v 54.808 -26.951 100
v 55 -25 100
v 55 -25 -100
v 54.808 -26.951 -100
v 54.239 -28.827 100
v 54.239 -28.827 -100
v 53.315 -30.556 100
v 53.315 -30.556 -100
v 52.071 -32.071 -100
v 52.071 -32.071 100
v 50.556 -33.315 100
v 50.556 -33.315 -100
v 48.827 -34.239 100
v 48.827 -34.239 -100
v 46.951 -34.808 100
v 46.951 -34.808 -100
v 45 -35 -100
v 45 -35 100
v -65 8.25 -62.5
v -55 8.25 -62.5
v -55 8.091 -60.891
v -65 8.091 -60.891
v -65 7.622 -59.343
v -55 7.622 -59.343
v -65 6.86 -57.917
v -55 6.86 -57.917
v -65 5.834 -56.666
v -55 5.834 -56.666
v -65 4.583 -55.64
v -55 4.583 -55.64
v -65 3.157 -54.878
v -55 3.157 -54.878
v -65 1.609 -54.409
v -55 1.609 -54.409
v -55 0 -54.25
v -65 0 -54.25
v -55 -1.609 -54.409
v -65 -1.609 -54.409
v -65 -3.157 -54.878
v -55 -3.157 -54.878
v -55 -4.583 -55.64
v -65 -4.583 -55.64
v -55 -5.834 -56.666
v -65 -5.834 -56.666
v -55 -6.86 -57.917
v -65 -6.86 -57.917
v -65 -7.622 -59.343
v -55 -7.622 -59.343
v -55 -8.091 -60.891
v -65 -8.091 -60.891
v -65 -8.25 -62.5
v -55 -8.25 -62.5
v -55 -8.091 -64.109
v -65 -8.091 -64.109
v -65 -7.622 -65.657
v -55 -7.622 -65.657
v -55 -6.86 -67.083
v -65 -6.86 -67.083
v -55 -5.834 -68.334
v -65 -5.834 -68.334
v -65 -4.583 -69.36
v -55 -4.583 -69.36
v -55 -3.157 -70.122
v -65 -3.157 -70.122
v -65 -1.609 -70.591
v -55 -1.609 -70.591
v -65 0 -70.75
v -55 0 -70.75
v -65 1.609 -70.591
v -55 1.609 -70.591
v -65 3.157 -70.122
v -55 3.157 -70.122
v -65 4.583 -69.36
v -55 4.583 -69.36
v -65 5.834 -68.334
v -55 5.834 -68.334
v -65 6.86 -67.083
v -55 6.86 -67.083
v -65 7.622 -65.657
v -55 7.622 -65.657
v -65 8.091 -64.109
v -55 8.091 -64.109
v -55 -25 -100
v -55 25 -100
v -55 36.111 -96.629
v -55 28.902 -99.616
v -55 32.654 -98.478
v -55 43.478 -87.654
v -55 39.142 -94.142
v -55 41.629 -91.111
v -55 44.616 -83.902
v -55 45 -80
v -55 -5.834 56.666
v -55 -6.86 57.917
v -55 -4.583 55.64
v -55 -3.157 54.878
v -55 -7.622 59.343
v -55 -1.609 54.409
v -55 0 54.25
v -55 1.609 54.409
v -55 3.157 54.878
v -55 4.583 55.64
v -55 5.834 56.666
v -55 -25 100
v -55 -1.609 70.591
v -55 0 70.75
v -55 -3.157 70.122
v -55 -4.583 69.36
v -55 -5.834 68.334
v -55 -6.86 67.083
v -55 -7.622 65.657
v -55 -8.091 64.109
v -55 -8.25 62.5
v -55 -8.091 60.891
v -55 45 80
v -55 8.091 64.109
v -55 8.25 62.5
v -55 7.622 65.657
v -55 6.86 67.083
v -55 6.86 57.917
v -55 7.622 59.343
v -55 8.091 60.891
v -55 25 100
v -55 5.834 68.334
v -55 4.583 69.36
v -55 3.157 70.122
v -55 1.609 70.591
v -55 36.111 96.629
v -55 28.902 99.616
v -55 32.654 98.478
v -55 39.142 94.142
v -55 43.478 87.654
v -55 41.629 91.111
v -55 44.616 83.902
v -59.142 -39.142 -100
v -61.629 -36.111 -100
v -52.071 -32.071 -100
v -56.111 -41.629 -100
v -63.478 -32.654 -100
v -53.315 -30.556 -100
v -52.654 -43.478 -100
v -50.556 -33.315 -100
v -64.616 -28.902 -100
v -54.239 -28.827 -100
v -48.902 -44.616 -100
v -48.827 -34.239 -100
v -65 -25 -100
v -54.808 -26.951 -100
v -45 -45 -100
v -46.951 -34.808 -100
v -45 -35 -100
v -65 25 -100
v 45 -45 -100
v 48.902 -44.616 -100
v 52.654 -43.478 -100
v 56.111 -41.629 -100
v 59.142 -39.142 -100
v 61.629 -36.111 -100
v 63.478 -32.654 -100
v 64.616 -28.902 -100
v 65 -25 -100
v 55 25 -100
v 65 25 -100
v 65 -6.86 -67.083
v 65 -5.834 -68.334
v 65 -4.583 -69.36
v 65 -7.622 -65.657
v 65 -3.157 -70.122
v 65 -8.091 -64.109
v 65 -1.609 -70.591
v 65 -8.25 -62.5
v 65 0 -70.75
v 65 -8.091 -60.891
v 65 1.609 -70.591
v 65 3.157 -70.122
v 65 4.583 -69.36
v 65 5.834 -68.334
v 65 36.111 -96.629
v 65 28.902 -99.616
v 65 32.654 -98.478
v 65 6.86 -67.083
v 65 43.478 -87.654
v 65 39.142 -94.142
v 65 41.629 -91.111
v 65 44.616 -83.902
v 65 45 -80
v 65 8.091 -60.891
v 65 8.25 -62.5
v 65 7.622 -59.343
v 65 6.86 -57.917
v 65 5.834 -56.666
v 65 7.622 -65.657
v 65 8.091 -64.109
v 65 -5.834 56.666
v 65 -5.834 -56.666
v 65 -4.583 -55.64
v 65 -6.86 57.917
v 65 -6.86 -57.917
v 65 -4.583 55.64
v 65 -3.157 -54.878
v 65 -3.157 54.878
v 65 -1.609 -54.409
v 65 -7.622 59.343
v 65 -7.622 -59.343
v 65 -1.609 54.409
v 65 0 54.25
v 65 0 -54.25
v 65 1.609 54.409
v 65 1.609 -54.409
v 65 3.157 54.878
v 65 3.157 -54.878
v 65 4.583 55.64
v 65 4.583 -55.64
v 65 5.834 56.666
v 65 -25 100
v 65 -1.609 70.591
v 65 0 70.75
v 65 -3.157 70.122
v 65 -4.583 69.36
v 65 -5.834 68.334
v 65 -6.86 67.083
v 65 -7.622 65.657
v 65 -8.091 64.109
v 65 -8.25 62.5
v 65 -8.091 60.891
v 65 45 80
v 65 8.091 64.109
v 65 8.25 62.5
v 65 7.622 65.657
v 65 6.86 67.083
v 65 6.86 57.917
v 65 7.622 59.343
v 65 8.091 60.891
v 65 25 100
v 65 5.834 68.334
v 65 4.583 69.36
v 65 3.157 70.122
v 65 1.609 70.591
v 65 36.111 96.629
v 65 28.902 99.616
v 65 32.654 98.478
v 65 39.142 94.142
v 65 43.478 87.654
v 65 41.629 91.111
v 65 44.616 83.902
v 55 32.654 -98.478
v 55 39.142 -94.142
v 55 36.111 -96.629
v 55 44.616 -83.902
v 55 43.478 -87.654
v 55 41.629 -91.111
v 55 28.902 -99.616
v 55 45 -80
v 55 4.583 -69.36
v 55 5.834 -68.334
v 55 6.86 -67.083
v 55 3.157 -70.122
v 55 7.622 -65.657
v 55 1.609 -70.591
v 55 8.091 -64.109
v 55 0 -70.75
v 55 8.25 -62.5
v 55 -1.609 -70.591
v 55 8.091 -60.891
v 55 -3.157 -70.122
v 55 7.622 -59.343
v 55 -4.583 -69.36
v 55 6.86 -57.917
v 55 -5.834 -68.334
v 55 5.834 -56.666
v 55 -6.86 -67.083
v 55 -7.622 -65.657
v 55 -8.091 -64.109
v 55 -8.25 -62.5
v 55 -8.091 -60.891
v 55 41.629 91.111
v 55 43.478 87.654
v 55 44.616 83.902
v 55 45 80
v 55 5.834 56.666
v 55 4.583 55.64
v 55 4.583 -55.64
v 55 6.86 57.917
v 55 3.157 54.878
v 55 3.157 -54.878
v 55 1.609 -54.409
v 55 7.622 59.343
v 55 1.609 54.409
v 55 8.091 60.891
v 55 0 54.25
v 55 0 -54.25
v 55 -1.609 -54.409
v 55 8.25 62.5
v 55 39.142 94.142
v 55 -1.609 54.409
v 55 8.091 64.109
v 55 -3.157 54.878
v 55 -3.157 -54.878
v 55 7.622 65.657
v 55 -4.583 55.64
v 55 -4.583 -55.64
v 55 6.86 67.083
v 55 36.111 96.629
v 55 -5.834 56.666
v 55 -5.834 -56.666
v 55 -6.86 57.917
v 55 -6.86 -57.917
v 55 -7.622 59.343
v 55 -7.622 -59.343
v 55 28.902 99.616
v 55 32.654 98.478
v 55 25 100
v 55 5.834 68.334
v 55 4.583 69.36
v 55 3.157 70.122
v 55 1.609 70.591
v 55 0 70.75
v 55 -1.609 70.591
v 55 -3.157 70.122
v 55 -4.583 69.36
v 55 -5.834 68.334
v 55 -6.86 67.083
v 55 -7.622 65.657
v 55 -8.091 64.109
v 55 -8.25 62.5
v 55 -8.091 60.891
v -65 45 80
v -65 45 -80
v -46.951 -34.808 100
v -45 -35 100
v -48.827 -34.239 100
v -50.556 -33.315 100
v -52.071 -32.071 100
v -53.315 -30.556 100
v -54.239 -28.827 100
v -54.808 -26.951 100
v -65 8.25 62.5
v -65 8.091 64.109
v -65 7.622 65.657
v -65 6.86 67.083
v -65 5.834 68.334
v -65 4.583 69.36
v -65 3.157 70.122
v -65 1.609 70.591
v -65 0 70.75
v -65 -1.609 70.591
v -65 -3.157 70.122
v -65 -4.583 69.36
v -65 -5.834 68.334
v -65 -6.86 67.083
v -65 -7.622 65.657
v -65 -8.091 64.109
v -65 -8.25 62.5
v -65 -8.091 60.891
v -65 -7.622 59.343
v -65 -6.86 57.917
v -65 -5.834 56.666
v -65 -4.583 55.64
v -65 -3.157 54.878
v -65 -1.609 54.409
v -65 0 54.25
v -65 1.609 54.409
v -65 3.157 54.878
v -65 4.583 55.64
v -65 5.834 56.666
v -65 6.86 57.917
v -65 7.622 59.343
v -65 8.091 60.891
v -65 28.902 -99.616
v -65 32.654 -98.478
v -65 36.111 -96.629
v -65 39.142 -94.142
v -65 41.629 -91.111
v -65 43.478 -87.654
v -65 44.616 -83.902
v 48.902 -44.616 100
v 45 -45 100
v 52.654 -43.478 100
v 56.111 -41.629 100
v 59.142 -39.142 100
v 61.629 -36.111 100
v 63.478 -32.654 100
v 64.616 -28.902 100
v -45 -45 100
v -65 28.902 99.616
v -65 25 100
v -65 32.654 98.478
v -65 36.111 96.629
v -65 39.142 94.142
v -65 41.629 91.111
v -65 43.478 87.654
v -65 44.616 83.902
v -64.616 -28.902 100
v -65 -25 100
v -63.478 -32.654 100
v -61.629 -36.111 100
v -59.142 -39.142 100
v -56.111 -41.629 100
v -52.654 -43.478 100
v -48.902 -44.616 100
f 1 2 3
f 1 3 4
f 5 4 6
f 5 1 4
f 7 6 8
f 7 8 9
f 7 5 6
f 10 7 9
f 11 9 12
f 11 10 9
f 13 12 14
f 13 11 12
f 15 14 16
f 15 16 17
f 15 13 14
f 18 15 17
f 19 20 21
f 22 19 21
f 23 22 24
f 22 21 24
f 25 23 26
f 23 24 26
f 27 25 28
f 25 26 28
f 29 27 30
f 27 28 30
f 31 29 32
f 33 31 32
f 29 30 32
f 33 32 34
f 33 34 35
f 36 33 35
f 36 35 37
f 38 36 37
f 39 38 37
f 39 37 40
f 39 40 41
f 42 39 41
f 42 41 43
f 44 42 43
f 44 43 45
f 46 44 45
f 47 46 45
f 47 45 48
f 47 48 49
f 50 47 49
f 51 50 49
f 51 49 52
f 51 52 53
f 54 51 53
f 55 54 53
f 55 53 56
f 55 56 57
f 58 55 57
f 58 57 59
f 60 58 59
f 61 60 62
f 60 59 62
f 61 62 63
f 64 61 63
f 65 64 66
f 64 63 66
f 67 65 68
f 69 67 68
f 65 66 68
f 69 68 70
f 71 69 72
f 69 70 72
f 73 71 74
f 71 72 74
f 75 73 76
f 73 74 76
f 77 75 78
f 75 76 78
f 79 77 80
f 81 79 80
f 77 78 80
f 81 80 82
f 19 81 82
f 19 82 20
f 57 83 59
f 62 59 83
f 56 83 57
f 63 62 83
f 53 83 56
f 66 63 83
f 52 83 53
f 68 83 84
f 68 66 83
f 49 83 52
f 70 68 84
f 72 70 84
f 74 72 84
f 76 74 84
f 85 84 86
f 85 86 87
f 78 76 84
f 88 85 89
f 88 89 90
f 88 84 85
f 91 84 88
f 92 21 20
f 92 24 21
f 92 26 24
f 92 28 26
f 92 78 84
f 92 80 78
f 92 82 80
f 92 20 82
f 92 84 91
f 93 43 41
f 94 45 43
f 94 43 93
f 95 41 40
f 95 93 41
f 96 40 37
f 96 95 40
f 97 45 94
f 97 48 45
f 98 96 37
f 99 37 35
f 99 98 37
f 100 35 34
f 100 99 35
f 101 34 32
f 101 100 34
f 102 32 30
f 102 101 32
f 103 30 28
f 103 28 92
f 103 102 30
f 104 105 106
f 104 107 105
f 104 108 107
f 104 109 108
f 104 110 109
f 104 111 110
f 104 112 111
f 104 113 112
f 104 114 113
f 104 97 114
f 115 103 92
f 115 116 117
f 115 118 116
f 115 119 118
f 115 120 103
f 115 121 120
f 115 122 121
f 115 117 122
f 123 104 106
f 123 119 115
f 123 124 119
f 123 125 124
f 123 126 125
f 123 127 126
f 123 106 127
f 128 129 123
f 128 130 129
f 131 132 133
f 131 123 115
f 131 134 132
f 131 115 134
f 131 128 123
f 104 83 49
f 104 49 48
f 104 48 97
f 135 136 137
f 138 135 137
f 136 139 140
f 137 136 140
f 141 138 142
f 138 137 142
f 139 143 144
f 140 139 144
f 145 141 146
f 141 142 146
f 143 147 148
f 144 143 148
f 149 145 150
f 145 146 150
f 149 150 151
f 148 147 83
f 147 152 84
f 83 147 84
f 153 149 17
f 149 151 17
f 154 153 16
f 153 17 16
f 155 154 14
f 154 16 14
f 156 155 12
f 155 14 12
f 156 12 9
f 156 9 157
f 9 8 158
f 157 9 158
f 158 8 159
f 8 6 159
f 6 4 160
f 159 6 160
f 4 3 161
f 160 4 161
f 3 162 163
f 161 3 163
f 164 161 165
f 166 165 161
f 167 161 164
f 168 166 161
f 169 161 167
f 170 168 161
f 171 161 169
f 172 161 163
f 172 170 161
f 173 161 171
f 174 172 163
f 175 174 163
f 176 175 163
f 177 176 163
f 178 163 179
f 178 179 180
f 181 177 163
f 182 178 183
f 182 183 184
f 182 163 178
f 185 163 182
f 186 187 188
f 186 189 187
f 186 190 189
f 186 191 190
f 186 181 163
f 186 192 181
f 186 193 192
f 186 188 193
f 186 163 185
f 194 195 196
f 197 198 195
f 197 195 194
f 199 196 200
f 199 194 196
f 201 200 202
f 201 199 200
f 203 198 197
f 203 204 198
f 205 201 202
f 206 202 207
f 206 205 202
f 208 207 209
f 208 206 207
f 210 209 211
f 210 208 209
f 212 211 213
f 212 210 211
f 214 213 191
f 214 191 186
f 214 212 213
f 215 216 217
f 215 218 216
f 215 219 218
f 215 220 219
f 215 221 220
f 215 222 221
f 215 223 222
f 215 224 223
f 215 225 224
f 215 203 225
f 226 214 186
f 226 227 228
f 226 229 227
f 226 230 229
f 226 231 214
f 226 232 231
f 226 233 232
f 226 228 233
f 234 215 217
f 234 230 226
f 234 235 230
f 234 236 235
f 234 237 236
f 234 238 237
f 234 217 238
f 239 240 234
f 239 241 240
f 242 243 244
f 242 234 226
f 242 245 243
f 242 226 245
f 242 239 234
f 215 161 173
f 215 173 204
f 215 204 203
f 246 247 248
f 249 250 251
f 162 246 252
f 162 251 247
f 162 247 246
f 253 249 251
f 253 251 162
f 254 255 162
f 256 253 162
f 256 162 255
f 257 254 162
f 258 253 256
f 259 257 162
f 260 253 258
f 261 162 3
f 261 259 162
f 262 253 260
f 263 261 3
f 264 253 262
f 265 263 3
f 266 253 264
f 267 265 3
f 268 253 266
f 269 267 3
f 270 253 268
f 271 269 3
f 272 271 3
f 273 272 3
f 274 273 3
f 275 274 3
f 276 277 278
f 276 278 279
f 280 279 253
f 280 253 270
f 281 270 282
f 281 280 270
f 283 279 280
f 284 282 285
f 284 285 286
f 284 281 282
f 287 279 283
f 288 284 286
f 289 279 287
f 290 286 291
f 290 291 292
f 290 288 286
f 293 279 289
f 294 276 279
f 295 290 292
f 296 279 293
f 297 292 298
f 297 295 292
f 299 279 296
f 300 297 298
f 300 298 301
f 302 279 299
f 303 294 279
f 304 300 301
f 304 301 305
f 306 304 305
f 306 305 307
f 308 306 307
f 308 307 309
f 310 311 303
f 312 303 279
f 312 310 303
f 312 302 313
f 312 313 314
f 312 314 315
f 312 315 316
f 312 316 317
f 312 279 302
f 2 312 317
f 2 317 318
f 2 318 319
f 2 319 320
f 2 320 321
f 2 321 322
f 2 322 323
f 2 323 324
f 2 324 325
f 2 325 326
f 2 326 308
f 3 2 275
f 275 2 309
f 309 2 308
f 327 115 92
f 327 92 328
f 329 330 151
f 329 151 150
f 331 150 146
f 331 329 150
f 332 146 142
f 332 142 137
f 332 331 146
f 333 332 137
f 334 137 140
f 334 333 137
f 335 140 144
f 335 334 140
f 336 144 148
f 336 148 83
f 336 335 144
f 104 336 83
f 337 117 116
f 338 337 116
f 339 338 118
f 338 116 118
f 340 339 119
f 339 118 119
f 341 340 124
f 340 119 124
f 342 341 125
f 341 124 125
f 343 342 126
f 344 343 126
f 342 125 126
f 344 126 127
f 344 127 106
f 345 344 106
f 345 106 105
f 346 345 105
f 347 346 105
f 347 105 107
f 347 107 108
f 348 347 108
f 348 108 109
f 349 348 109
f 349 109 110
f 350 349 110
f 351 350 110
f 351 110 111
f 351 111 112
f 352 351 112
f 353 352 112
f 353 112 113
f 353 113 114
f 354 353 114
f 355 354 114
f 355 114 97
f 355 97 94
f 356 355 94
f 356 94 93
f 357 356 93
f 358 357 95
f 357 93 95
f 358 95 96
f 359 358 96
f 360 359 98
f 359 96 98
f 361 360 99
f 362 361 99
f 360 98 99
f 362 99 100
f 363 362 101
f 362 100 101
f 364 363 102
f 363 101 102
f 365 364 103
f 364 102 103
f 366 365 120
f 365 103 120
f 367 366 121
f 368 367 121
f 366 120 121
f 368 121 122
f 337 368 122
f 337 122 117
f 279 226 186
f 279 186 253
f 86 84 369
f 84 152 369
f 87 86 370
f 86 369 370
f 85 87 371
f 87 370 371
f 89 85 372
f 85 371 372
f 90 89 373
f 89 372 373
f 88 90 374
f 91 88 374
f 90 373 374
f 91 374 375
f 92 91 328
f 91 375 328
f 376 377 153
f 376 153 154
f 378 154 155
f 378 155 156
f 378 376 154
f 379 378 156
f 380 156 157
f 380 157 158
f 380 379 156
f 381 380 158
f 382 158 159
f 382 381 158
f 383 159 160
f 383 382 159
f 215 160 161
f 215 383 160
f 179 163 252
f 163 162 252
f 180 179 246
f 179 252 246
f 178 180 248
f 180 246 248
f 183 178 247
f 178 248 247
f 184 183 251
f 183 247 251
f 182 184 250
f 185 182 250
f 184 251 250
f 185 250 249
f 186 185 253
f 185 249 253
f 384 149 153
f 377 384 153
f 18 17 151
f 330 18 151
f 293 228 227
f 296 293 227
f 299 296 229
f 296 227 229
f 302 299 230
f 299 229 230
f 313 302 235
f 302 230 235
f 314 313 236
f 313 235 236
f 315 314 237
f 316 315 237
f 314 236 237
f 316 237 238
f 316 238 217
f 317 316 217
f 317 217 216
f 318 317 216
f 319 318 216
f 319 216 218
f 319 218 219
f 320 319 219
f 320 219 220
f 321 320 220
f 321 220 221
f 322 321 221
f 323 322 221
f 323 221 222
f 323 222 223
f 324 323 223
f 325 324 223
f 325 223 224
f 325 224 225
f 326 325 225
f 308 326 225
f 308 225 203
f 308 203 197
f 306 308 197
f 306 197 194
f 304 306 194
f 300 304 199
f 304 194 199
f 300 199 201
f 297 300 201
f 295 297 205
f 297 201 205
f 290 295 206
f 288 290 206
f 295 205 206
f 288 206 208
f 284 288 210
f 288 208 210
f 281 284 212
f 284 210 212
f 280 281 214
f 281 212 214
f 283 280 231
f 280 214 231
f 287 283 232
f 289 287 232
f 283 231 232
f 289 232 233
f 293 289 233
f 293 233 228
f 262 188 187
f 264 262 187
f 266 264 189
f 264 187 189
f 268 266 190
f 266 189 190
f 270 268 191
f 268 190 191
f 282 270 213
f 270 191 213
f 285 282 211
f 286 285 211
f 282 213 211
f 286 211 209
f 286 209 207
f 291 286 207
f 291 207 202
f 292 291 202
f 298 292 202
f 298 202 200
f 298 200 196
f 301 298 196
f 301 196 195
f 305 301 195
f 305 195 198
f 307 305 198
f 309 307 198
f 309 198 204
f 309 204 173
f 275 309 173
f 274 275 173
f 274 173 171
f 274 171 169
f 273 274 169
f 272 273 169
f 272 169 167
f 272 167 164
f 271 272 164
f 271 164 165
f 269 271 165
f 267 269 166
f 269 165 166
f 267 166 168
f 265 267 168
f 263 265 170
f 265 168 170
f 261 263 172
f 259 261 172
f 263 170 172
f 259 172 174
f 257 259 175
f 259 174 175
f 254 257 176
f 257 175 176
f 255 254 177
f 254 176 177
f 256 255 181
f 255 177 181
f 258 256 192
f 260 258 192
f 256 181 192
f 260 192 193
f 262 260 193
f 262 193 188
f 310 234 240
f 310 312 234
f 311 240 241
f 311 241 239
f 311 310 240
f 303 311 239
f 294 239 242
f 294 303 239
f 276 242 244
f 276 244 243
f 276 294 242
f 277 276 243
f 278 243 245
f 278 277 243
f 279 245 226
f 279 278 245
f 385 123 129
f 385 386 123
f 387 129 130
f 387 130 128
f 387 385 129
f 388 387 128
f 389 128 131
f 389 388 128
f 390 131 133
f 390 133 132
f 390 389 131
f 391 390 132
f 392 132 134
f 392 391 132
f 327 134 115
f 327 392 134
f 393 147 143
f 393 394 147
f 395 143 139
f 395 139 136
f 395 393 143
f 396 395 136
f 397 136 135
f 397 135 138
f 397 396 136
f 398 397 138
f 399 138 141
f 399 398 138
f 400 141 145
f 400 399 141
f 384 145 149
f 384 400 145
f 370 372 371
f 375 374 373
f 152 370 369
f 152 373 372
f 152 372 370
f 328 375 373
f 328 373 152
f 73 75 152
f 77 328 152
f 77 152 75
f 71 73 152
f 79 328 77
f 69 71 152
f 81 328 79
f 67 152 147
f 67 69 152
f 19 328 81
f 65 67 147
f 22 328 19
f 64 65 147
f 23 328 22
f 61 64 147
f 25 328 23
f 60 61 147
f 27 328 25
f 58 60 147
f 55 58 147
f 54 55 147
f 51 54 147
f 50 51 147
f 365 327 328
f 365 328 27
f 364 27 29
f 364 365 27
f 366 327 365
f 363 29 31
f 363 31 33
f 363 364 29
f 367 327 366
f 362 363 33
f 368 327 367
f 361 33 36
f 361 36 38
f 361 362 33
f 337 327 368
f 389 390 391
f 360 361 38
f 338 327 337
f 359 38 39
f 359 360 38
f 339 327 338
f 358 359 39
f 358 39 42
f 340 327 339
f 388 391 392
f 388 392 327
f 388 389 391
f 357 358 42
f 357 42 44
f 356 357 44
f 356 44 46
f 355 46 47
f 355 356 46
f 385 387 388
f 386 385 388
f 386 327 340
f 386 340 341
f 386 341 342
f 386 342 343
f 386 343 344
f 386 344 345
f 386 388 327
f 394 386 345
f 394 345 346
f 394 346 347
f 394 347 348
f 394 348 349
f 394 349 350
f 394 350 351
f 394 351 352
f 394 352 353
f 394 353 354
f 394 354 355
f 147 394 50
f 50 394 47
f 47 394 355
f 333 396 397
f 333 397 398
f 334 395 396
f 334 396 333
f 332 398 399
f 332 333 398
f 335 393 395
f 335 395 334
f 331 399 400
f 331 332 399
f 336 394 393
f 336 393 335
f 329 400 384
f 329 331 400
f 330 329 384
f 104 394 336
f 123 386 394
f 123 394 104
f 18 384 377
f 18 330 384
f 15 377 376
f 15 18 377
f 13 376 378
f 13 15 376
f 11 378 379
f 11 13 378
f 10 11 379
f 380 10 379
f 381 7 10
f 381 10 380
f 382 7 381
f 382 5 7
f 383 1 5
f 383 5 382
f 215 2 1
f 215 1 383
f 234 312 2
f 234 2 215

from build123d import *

# Parameters (mm, degrees)
F1_DEPTH = 100
F2_R     = 8.25
F3_DEPTH = 130.001
F4_R     = 20


with BuildPart() as f1:
    # F0 (on Top) → F1 (new body, symmetric)
    with BuildSketch(Plane.XY):
        with BuildLine():
            Line((-45, -45), (45, -45))
            ThreePointArc((45, -45), (59.142136, -39.142136), (65, -25))
            Line((65, -25), (65, 45))
            Line((65, 45), (55, 45))
            Line((55, 45), (55, -25))
            ThreePointArc((55, -25), (52.071068, -32.071068), (45, -35))
            Line((45, -35), (-45, -35))
            ThreePointArc((-45, -35), (-52.071068, -32.071068), (-55, -25))
            Line((-55, -25), (-55, 45))
            Line((-55, 45), (-65, 45))
            Line((-65, 45), (-65, -25))
            ThreePointArc((-65, -25), (-59.142136, -39.142136), (-45, -45))
        make_face()
    extrude(amount=F1_DEPTH, both=True)

    # F2 (on face) → F3 (cut, through all)
    with BuildSketch(Plane.YZ.offset(65)):
        with Locations((0, 62.5)):
            Circle(F2_R)
        with Locations((0, -62.5)):
            Circle(F2_R)
    extrude(amount=-F3_DEPTH, mode=Mode.SUBTRACT)

    # F4
    f4_edges = [f1.edges().sort_by_distance(p)[0] for p in [
        (60, 45, 100),
        (-60, 45, 100),
        (-60, 45, -100),
        (60, 45, -100),
    ]]
    fillet(f4_edges, radius=F4_R)


solid = f1.part
